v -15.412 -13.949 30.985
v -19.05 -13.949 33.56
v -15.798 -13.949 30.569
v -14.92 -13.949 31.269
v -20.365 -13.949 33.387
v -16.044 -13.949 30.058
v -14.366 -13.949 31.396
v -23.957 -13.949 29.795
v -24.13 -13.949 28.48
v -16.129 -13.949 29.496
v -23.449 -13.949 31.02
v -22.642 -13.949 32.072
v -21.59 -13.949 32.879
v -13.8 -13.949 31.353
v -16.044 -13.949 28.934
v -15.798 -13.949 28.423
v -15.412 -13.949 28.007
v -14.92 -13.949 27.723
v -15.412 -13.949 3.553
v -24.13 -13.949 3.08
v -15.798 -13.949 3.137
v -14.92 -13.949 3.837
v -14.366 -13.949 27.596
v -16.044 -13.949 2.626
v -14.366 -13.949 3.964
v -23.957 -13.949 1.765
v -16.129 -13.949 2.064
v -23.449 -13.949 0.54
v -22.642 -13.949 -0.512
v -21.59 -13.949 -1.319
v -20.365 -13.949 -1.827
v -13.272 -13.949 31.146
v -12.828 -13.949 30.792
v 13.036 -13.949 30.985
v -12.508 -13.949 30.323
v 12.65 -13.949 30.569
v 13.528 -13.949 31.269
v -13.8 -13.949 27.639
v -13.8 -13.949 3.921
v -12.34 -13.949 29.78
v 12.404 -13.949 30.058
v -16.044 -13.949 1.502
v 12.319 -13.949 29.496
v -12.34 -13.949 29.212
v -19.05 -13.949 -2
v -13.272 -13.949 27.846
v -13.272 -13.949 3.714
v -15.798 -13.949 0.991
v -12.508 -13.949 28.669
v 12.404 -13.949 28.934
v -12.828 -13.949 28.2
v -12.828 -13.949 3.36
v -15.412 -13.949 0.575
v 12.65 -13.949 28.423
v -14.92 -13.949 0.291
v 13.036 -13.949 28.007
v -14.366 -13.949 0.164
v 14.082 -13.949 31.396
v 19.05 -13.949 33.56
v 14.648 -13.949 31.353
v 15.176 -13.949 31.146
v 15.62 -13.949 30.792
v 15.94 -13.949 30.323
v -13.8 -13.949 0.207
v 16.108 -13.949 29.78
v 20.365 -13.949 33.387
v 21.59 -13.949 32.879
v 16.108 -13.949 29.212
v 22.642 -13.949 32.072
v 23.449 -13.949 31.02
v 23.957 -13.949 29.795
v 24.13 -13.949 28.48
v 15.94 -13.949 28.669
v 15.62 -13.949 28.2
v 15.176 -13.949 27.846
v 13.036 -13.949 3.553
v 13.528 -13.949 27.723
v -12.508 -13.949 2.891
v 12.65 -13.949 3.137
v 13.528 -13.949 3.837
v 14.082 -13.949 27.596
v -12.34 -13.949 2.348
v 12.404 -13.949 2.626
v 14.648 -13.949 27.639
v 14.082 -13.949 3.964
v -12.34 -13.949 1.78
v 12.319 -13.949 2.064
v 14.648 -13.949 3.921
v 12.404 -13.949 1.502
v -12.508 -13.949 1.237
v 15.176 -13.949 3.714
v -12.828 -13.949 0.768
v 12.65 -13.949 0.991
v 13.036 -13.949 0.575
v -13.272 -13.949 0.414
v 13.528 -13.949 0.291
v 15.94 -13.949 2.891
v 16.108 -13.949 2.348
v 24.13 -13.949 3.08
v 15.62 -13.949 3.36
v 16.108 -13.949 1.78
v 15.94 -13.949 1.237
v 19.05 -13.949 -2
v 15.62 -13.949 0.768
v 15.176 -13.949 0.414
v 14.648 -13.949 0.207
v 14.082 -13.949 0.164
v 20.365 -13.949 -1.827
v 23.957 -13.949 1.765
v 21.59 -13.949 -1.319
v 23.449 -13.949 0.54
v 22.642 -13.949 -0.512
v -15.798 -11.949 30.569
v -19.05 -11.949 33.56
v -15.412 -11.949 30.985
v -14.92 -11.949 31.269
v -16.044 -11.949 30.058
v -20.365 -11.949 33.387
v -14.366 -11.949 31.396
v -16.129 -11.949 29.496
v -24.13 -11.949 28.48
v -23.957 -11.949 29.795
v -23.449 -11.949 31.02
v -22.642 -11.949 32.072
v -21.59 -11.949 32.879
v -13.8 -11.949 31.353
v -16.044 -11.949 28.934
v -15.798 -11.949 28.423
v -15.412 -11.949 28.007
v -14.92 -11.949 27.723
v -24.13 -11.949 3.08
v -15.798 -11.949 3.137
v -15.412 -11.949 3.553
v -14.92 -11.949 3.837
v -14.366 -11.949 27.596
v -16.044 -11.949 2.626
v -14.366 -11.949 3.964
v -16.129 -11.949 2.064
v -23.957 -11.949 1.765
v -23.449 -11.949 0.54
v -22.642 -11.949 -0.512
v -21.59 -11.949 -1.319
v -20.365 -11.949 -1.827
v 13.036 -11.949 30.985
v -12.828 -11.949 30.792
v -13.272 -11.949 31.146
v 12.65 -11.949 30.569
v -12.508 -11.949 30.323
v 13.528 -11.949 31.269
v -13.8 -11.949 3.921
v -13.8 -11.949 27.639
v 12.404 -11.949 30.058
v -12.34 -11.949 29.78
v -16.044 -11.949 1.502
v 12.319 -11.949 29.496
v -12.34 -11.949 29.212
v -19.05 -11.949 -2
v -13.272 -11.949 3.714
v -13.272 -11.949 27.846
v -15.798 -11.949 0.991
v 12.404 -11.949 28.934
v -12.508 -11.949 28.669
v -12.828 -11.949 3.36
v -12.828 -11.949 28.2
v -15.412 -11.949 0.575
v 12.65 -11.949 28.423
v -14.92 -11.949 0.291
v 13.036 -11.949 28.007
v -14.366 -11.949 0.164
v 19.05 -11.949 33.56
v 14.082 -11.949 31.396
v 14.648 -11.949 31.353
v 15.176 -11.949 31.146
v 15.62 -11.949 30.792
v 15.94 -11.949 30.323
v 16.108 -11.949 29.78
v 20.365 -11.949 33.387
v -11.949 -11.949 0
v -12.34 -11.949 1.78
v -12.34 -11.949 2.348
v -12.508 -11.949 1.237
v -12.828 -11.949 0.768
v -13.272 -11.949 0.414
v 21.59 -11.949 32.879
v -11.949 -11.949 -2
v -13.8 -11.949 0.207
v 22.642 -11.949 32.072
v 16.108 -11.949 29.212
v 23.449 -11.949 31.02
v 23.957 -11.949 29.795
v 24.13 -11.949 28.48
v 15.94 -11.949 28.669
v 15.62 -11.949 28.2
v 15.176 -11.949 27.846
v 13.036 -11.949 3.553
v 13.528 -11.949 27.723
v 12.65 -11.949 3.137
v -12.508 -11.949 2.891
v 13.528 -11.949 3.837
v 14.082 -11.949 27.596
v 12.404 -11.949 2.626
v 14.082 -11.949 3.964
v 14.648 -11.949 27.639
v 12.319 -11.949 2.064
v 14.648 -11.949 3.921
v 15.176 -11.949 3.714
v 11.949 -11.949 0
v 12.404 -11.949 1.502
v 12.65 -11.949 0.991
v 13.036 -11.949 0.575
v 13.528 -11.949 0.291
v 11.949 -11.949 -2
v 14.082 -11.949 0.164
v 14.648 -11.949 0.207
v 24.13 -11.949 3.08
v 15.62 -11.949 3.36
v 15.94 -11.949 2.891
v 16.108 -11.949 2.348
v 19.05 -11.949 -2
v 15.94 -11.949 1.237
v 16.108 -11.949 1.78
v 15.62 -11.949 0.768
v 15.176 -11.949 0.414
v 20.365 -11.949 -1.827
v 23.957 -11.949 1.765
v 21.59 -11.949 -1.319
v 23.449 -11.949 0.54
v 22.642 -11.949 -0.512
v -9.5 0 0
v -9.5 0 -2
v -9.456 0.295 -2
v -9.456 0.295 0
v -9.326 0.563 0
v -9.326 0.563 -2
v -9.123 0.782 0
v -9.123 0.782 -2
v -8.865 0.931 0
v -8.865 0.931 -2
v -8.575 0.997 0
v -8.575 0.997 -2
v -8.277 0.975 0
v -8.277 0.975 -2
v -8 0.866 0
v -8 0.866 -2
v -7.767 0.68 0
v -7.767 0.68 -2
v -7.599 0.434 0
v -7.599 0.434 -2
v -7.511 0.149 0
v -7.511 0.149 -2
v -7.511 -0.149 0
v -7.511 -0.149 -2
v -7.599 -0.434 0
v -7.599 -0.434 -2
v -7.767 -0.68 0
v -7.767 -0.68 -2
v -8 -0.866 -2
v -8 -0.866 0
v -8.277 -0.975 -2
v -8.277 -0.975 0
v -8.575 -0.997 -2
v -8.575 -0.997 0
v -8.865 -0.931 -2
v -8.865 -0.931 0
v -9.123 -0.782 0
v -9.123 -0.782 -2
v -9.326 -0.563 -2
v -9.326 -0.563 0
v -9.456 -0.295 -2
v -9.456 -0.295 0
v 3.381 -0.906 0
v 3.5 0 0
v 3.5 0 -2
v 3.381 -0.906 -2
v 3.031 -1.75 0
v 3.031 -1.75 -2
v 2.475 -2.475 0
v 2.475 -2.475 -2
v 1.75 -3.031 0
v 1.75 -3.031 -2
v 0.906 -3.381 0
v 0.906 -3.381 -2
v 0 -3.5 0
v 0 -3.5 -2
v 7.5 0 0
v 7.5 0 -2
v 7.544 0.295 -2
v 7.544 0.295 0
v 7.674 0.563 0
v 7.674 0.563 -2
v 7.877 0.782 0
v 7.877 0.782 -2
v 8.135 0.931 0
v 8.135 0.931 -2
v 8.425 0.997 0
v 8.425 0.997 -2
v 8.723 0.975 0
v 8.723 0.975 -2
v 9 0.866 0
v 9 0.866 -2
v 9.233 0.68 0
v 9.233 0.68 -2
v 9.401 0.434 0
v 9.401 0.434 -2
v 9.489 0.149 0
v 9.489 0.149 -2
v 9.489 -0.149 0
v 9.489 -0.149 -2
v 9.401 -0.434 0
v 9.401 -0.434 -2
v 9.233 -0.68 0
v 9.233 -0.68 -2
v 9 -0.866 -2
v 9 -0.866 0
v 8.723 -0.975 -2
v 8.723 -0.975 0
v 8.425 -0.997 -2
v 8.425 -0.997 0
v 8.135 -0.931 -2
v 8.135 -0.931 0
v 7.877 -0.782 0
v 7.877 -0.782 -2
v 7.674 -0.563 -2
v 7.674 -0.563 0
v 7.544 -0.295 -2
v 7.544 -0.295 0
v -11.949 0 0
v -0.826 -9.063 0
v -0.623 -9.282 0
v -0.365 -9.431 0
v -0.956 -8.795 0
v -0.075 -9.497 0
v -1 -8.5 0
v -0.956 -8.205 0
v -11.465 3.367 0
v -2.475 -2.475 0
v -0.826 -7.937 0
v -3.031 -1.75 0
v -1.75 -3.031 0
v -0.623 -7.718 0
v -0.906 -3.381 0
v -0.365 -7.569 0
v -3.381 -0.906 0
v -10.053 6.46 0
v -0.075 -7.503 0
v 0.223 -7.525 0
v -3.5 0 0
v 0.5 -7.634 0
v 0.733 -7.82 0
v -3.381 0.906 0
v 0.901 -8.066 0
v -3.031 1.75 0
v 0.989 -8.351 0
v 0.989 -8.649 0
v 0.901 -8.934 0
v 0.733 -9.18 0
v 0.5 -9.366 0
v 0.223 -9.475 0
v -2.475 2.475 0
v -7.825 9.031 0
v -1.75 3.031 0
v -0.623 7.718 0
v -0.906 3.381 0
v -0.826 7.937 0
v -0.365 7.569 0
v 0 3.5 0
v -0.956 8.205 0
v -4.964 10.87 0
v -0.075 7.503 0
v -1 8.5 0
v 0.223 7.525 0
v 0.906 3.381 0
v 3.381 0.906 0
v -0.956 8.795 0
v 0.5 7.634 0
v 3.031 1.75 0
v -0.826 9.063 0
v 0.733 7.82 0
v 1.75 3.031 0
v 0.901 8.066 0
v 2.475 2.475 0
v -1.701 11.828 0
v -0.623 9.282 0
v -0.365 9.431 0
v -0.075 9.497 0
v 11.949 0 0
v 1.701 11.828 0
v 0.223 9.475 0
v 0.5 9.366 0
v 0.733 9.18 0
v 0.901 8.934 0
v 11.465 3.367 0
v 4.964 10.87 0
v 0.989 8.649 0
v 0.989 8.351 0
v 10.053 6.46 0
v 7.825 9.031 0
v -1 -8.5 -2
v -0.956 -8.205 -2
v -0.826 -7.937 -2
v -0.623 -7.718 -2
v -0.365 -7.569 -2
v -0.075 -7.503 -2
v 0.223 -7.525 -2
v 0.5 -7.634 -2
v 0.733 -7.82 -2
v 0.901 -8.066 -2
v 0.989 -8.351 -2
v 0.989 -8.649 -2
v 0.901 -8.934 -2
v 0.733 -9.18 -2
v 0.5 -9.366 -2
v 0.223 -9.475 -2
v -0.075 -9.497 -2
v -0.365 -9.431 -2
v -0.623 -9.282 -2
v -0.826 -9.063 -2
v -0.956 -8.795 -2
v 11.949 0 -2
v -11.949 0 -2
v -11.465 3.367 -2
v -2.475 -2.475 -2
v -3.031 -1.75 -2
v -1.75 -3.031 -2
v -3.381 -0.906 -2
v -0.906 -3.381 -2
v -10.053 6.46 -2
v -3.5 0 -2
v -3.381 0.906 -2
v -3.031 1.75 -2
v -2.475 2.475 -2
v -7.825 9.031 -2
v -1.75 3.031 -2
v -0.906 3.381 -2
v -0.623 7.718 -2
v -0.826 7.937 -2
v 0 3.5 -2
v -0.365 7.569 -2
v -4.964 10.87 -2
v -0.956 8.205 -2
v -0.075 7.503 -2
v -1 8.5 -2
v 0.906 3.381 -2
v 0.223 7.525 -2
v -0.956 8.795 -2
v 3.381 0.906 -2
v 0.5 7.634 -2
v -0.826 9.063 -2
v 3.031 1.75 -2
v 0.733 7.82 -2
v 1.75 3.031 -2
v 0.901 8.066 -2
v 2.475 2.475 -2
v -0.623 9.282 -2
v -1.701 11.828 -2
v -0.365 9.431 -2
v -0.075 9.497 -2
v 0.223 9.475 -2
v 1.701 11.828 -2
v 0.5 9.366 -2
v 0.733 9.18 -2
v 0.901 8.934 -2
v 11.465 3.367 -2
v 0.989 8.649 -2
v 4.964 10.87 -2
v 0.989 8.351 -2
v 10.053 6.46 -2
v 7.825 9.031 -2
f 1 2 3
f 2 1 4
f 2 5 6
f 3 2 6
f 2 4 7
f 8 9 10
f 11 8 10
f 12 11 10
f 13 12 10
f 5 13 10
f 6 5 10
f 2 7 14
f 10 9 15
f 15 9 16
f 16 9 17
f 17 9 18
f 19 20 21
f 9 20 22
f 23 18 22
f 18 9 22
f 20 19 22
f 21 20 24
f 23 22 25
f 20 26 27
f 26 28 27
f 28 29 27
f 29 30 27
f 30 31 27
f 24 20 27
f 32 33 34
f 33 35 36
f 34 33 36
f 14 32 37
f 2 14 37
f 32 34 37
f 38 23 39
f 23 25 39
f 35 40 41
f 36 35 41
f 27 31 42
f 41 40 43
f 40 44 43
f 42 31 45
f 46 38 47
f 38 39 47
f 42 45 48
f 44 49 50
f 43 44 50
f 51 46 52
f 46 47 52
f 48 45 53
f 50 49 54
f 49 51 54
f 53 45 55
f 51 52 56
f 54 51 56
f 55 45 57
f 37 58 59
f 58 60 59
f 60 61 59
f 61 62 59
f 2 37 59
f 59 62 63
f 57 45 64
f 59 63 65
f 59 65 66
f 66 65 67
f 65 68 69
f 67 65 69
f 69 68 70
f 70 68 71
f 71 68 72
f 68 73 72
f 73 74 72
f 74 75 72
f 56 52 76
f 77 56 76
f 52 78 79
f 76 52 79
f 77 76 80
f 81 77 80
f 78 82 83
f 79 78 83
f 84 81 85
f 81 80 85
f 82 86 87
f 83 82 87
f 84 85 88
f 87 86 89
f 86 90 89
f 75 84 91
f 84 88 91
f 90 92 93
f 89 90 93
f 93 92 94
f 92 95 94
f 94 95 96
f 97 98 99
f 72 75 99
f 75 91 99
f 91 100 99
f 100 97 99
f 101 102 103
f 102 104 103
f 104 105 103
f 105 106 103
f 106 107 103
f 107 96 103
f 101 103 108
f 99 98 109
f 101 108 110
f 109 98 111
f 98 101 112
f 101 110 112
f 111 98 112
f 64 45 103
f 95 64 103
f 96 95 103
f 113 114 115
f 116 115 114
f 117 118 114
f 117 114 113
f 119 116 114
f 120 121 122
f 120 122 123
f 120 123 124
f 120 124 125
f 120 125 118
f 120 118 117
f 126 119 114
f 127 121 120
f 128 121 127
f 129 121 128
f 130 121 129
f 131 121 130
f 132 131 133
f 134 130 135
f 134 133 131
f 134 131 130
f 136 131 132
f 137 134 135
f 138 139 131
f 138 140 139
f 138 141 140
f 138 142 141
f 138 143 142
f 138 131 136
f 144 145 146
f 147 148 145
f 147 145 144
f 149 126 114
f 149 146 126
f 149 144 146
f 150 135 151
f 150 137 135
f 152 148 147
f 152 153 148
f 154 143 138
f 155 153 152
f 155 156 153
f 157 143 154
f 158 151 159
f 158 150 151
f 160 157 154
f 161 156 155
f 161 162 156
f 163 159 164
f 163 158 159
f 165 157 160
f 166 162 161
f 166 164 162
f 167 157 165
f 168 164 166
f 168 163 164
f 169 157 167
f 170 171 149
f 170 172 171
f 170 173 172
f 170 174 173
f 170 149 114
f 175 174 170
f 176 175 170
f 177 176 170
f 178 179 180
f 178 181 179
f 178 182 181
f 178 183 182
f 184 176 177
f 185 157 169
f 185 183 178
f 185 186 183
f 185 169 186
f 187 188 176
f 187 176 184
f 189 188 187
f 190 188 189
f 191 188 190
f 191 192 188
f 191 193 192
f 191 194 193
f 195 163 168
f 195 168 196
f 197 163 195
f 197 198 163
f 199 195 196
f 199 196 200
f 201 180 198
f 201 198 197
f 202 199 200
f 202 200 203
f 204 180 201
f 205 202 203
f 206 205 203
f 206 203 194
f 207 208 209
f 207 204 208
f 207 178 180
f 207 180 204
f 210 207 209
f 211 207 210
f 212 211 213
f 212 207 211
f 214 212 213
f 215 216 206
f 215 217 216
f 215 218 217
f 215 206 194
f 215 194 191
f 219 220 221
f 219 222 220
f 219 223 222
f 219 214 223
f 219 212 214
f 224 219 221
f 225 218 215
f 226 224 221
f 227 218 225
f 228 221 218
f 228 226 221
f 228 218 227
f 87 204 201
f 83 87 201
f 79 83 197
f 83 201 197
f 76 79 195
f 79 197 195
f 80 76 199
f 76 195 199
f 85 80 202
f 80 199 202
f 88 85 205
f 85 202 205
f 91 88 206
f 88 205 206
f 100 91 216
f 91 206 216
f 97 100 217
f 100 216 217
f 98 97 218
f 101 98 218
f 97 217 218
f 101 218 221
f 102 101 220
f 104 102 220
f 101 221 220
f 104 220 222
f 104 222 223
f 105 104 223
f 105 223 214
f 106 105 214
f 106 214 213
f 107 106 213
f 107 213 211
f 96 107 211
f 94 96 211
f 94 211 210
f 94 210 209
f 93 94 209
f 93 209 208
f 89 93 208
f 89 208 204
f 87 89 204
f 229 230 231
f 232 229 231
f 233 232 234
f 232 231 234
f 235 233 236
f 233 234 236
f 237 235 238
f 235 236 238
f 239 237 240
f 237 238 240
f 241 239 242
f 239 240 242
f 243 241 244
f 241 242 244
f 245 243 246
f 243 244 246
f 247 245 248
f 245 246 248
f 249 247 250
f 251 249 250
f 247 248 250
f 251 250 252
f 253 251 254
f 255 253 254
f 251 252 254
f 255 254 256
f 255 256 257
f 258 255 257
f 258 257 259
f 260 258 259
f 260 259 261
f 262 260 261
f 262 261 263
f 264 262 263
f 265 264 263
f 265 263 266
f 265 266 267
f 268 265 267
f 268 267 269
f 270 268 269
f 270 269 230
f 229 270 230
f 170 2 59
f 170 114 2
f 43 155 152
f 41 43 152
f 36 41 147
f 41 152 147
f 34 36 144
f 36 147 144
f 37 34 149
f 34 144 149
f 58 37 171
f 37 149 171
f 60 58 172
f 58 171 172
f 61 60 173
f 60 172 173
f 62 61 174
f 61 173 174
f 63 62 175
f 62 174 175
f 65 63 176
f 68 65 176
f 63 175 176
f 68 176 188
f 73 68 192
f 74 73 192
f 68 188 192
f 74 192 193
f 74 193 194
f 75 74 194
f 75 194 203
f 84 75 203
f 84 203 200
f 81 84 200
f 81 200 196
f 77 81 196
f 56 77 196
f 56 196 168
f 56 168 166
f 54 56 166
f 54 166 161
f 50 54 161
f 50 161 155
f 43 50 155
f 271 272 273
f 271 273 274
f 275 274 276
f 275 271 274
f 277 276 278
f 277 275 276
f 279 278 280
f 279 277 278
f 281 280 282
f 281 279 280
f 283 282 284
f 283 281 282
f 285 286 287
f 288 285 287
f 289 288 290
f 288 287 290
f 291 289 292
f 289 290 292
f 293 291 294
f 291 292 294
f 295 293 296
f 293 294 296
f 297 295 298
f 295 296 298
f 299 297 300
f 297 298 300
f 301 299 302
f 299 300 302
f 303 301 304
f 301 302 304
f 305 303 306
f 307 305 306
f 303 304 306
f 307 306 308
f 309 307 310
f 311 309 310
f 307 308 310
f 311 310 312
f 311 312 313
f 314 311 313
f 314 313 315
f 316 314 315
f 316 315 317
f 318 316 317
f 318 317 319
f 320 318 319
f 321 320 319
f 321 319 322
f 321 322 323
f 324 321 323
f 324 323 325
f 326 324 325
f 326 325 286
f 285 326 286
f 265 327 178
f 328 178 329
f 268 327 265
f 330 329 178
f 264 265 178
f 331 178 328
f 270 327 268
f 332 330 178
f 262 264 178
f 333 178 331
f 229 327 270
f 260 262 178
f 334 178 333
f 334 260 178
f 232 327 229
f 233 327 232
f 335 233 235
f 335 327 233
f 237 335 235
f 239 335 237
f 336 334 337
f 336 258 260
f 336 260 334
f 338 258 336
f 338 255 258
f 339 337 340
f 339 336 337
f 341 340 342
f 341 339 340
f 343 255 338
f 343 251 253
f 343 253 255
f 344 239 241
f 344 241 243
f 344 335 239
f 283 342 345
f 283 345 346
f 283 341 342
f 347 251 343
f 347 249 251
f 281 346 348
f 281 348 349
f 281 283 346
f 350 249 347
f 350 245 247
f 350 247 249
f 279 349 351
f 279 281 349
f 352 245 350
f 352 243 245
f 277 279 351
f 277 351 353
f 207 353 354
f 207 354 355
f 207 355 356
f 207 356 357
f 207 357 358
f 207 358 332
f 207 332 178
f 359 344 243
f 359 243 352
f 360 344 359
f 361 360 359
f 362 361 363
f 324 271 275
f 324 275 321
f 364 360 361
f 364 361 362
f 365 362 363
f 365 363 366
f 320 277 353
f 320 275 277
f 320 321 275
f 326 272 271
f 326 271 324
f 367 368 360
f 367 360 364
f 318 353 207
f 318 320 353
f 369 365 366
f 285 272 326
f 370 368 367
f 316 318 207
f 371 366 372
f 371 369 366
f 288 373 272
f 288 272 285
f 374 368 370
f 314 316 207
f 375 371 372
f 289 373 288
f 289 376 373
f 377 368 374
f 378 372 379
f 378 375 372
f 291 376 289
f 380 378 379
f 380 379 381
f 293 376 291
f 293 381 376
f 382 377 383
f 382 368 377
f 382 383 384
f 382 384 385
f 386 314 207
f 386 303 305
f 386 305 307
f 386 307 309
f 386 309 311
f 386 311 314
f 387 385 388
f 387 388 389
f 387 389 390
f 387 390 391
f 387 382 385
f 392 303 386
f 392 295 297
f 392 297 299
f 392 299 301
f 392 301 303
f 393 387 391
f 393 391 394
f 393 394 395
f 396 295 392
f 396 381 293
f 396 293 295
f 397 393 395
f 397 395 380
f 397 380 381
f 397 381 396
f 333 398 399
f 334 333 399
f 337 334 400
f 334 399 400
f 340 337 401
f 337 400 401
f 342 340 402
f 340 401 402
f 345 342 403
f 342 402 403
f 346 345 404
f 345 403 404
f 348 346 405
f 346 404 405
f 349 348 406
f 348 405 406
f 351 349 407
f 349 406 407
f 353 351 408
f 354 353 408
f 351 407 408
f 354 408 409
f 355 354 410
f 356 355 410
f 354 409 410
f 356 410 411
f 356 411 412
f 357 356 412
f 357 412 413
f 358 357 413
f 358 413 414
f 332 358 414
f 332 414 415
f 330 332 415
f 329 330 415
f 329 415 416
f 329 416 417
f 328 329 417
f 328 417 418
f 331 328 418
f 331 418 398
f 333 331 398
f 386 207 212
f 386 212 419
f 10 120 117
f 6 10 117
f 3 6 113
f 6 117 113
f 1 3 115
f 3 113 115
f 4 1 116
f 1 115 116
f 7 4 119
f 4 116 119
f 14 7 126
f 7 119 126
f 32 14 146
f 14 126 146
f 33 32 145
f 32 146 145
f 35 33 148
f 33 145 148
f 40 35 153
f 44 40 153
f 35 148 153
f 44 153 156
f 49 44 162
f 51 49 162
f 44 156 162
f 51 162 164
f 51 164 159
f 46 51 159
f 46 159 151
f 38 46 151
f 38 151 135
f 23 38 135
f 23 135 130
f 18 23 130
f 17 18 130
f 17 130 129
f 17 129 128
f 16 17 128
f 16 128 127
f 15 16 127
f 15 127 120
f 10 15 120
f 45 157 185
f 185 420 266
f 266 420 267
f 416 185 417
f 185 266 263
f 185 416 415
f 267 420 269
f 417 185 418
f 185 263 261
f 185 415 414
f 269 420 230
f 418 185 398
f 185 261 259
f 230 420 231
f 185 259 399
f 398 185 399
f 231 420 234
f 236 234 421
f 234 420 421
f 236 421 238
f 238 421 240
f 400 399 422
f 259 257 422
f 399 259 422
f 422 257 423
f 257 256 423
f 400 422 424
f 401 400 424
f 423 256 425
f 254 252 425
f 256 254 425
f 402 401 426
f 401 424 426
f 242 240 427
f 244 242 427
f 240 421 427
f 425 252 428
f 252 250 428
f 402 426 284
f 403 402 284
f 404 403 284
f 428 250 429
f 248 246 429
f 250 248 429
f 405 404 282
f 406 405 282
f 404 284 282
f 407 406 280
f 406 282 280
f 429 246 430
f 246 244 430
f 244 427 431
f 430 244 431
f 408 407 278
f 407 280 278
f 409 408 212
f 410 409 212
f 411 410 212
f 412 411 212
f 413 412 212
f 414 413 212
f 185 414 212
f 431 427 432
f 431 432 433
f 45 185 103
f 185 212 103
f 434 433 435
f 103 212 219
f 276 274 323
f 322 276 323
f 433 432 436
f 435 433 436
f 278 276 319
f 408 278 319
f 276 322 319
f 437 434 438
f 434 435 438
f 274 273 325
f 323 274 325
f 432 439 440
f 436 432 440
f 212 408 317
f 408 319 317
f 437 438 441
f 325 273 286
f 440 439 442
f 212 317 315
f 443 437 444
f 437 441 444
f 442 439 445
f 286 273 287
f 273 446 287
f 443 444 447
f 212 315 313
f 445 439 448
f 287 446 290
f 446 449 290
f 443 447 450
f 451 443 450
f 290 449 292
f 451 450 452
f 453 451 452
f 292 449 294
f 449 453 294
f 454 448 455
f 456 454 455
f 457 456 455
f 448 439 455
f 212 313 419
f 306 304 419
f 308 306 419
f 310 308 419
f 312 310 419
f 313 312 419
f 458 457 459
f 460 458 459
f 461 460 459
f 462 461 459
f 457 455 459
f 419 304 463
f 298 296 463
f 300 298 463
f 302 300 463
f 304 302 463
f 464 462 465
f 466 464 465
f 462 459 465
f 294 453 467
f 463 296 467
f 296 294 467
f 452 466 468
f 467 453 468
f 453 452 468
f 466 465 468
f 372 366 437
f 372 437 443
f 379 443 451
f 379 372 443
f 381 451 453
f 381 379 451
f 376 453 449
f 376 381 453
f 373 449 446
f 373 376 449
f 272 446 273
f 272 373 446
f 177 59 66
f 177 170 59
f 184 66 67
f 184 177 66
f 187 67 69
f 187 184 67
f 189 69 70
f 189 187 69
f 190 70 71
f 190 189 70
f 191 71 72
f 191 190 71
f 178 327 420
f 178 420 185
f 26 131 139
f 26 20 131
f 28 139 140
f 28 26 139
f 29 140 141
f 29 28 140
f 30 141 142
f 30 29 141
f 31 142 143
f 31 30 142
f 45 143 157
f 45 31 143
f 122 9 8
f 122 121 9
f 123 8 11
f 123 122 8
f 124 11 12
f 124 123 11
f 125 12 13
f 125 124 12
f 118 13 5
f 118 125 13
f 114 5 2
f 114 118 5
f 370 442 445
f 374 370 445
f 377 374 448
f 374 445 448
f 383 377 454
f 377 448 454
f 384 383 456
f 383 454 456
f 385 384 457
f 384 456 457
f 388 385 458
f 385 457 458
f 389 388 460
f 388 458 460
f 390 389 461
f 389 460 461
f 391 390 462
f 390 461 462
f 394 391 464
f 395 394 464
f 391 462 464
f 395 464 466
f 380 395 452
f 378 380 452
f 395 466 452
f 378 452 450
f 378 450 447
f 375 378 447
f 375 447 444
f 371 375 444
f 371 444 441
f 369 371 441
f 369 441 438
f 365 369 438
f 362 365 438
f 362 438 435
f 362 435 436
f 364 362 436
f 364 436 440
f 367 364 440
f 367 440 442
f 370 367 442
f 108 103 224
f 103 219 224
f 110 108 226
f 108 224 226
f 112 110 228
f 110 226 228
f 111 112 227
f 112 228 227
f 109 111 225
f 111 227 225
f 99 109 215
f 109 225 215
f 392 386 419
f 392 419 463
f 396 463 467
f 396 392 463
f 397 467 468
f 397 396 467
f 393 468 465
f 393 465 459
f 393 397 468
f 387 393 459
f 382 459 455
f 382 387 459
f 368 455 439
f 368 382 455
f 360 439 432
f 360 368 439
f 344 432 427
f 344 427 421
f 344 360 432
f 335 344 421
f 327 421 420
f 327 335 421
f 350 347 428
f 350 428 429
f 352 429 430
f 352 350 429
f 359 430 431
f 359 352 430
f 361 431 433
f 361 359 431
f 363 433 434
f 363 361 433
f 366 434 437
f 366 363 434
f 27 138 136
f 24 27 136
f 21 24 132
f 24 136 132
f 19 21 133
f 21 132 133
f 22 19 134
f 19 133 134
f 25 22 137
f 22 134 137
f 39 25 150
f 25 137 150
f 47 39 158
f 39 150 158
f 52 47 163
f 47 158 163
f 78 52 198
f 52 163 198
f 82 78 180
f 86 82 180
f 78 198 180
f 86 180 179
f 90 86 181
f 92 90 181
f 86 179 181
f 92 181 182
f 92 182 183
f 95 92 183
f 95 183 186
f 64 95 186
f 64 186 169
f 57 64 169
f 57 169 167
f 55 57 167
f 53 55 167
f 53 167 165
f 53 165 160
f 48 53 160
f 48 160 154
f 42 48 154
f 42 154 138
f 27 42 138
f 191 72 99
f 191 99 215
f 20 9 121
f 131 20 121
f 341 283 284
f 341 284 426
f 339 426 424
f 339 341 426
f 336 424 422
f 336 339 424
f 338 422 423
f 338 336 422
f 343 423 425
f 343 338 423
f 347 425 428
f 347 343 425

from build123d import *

# Parameters (mm, degrees)
F1_DEPTH = 2
F2_W     = 48.26
F2_H     = 2
F3_DEPTH = 33.56
F5_D     = 3.81
F6_R     = 5.08
F7_D     = 2


with BuildPart() as f1:
    # F0 (on Top) → F1 (new body)
    with BuildSketch(Plane.XY):
        with BuildLine():
            ThreePointArc((0, -11.94943), (8.449523, -8.449523), (11.94943, 0))
            ThreePointArc((11.94943, 0), (0, 11.94943), (-11.94943, 0))
            ThreePointArc((-11.94943, 0), (-8.449523, -8.449523), (0, -11.94943))
        make_face()
        with BuildLine():
            ThreePointArc((0, 3.5), (2.474874, 2.474874), (3.5, 0))
            ThreePointArc((3.5, 0), (2.474874, -2.474874), (0, -3.5))
            ThreePointArc((0, -3.5), (-2.474874, -2.474874), (-3.5, 0))
            ThreePointArc((-3.5, 0), (-2.474874, 2.474874), (0, 3.5))
        make_face(mode=Mode.SUBTRACT)
        with BuildLine():
            Line((11.94943, -11.94943), (11.94943, 0))
            ThreePointArc((11.94943, 0), (8.449523, -8.449523), (0, -11.94943))
            Line((0, -11.94943), (11.94943, -11.94943))
        make_face()
        with BuildLine():
            ThreePointArc((0, -11.94943), (-8.449523, -8.449523), (-11.94943, 0))
            Line((-11.94943, 0), (-11.94943, -11.94943))
            Line((-11.94943, -11.94943), (0, -11.94943))
        make_face()
        Polygon((11.94943, -11.94943), (0, -11.94943), (-11.94943, -11.94943), (-24.13, -11.94943), (-24.13, -13.94943), (24.13, -13.94943), (24.13, -11.94943), align=None)
    extrude(amount=-F1_DEPTH)

    # F2 (on face) → F3 (join)
    with BuildSketch(Plane.XY):
        with Locations((0, -12.94943)):
            Rectangle(F2_W, F2_H)
    extrude(amount=F3_DEPTH)

    # F5 (through all)
    with Locations(Plane.XZ.offset(13.94943)):
        with Locations((-14.224, 29.496), (14.224, 29.496), (14.224, 2.064), (-14.224, 2.064)):
            Hole(F5_D / 2)

    # F6
    f6_edges = [f1.edges().sort_by_distance(p)[0] for p in [
        (24.13, -12.94943, 33.56),
        (-24.13, -12.94943, 33.56),
        (-24.13, -12.94943, -2),
        (24.13, -12.94943, -2),
    ]]
    fillet(f6_edges, radius=F6_R)

    # F7 (through all)
    with Locations(Plane.XY):
        with Locations((0, -8.5), (8.5, 0), (-8.5, 0), (0, 8.5)):
            Hole(F7_D / 2)


solid = f1.part
